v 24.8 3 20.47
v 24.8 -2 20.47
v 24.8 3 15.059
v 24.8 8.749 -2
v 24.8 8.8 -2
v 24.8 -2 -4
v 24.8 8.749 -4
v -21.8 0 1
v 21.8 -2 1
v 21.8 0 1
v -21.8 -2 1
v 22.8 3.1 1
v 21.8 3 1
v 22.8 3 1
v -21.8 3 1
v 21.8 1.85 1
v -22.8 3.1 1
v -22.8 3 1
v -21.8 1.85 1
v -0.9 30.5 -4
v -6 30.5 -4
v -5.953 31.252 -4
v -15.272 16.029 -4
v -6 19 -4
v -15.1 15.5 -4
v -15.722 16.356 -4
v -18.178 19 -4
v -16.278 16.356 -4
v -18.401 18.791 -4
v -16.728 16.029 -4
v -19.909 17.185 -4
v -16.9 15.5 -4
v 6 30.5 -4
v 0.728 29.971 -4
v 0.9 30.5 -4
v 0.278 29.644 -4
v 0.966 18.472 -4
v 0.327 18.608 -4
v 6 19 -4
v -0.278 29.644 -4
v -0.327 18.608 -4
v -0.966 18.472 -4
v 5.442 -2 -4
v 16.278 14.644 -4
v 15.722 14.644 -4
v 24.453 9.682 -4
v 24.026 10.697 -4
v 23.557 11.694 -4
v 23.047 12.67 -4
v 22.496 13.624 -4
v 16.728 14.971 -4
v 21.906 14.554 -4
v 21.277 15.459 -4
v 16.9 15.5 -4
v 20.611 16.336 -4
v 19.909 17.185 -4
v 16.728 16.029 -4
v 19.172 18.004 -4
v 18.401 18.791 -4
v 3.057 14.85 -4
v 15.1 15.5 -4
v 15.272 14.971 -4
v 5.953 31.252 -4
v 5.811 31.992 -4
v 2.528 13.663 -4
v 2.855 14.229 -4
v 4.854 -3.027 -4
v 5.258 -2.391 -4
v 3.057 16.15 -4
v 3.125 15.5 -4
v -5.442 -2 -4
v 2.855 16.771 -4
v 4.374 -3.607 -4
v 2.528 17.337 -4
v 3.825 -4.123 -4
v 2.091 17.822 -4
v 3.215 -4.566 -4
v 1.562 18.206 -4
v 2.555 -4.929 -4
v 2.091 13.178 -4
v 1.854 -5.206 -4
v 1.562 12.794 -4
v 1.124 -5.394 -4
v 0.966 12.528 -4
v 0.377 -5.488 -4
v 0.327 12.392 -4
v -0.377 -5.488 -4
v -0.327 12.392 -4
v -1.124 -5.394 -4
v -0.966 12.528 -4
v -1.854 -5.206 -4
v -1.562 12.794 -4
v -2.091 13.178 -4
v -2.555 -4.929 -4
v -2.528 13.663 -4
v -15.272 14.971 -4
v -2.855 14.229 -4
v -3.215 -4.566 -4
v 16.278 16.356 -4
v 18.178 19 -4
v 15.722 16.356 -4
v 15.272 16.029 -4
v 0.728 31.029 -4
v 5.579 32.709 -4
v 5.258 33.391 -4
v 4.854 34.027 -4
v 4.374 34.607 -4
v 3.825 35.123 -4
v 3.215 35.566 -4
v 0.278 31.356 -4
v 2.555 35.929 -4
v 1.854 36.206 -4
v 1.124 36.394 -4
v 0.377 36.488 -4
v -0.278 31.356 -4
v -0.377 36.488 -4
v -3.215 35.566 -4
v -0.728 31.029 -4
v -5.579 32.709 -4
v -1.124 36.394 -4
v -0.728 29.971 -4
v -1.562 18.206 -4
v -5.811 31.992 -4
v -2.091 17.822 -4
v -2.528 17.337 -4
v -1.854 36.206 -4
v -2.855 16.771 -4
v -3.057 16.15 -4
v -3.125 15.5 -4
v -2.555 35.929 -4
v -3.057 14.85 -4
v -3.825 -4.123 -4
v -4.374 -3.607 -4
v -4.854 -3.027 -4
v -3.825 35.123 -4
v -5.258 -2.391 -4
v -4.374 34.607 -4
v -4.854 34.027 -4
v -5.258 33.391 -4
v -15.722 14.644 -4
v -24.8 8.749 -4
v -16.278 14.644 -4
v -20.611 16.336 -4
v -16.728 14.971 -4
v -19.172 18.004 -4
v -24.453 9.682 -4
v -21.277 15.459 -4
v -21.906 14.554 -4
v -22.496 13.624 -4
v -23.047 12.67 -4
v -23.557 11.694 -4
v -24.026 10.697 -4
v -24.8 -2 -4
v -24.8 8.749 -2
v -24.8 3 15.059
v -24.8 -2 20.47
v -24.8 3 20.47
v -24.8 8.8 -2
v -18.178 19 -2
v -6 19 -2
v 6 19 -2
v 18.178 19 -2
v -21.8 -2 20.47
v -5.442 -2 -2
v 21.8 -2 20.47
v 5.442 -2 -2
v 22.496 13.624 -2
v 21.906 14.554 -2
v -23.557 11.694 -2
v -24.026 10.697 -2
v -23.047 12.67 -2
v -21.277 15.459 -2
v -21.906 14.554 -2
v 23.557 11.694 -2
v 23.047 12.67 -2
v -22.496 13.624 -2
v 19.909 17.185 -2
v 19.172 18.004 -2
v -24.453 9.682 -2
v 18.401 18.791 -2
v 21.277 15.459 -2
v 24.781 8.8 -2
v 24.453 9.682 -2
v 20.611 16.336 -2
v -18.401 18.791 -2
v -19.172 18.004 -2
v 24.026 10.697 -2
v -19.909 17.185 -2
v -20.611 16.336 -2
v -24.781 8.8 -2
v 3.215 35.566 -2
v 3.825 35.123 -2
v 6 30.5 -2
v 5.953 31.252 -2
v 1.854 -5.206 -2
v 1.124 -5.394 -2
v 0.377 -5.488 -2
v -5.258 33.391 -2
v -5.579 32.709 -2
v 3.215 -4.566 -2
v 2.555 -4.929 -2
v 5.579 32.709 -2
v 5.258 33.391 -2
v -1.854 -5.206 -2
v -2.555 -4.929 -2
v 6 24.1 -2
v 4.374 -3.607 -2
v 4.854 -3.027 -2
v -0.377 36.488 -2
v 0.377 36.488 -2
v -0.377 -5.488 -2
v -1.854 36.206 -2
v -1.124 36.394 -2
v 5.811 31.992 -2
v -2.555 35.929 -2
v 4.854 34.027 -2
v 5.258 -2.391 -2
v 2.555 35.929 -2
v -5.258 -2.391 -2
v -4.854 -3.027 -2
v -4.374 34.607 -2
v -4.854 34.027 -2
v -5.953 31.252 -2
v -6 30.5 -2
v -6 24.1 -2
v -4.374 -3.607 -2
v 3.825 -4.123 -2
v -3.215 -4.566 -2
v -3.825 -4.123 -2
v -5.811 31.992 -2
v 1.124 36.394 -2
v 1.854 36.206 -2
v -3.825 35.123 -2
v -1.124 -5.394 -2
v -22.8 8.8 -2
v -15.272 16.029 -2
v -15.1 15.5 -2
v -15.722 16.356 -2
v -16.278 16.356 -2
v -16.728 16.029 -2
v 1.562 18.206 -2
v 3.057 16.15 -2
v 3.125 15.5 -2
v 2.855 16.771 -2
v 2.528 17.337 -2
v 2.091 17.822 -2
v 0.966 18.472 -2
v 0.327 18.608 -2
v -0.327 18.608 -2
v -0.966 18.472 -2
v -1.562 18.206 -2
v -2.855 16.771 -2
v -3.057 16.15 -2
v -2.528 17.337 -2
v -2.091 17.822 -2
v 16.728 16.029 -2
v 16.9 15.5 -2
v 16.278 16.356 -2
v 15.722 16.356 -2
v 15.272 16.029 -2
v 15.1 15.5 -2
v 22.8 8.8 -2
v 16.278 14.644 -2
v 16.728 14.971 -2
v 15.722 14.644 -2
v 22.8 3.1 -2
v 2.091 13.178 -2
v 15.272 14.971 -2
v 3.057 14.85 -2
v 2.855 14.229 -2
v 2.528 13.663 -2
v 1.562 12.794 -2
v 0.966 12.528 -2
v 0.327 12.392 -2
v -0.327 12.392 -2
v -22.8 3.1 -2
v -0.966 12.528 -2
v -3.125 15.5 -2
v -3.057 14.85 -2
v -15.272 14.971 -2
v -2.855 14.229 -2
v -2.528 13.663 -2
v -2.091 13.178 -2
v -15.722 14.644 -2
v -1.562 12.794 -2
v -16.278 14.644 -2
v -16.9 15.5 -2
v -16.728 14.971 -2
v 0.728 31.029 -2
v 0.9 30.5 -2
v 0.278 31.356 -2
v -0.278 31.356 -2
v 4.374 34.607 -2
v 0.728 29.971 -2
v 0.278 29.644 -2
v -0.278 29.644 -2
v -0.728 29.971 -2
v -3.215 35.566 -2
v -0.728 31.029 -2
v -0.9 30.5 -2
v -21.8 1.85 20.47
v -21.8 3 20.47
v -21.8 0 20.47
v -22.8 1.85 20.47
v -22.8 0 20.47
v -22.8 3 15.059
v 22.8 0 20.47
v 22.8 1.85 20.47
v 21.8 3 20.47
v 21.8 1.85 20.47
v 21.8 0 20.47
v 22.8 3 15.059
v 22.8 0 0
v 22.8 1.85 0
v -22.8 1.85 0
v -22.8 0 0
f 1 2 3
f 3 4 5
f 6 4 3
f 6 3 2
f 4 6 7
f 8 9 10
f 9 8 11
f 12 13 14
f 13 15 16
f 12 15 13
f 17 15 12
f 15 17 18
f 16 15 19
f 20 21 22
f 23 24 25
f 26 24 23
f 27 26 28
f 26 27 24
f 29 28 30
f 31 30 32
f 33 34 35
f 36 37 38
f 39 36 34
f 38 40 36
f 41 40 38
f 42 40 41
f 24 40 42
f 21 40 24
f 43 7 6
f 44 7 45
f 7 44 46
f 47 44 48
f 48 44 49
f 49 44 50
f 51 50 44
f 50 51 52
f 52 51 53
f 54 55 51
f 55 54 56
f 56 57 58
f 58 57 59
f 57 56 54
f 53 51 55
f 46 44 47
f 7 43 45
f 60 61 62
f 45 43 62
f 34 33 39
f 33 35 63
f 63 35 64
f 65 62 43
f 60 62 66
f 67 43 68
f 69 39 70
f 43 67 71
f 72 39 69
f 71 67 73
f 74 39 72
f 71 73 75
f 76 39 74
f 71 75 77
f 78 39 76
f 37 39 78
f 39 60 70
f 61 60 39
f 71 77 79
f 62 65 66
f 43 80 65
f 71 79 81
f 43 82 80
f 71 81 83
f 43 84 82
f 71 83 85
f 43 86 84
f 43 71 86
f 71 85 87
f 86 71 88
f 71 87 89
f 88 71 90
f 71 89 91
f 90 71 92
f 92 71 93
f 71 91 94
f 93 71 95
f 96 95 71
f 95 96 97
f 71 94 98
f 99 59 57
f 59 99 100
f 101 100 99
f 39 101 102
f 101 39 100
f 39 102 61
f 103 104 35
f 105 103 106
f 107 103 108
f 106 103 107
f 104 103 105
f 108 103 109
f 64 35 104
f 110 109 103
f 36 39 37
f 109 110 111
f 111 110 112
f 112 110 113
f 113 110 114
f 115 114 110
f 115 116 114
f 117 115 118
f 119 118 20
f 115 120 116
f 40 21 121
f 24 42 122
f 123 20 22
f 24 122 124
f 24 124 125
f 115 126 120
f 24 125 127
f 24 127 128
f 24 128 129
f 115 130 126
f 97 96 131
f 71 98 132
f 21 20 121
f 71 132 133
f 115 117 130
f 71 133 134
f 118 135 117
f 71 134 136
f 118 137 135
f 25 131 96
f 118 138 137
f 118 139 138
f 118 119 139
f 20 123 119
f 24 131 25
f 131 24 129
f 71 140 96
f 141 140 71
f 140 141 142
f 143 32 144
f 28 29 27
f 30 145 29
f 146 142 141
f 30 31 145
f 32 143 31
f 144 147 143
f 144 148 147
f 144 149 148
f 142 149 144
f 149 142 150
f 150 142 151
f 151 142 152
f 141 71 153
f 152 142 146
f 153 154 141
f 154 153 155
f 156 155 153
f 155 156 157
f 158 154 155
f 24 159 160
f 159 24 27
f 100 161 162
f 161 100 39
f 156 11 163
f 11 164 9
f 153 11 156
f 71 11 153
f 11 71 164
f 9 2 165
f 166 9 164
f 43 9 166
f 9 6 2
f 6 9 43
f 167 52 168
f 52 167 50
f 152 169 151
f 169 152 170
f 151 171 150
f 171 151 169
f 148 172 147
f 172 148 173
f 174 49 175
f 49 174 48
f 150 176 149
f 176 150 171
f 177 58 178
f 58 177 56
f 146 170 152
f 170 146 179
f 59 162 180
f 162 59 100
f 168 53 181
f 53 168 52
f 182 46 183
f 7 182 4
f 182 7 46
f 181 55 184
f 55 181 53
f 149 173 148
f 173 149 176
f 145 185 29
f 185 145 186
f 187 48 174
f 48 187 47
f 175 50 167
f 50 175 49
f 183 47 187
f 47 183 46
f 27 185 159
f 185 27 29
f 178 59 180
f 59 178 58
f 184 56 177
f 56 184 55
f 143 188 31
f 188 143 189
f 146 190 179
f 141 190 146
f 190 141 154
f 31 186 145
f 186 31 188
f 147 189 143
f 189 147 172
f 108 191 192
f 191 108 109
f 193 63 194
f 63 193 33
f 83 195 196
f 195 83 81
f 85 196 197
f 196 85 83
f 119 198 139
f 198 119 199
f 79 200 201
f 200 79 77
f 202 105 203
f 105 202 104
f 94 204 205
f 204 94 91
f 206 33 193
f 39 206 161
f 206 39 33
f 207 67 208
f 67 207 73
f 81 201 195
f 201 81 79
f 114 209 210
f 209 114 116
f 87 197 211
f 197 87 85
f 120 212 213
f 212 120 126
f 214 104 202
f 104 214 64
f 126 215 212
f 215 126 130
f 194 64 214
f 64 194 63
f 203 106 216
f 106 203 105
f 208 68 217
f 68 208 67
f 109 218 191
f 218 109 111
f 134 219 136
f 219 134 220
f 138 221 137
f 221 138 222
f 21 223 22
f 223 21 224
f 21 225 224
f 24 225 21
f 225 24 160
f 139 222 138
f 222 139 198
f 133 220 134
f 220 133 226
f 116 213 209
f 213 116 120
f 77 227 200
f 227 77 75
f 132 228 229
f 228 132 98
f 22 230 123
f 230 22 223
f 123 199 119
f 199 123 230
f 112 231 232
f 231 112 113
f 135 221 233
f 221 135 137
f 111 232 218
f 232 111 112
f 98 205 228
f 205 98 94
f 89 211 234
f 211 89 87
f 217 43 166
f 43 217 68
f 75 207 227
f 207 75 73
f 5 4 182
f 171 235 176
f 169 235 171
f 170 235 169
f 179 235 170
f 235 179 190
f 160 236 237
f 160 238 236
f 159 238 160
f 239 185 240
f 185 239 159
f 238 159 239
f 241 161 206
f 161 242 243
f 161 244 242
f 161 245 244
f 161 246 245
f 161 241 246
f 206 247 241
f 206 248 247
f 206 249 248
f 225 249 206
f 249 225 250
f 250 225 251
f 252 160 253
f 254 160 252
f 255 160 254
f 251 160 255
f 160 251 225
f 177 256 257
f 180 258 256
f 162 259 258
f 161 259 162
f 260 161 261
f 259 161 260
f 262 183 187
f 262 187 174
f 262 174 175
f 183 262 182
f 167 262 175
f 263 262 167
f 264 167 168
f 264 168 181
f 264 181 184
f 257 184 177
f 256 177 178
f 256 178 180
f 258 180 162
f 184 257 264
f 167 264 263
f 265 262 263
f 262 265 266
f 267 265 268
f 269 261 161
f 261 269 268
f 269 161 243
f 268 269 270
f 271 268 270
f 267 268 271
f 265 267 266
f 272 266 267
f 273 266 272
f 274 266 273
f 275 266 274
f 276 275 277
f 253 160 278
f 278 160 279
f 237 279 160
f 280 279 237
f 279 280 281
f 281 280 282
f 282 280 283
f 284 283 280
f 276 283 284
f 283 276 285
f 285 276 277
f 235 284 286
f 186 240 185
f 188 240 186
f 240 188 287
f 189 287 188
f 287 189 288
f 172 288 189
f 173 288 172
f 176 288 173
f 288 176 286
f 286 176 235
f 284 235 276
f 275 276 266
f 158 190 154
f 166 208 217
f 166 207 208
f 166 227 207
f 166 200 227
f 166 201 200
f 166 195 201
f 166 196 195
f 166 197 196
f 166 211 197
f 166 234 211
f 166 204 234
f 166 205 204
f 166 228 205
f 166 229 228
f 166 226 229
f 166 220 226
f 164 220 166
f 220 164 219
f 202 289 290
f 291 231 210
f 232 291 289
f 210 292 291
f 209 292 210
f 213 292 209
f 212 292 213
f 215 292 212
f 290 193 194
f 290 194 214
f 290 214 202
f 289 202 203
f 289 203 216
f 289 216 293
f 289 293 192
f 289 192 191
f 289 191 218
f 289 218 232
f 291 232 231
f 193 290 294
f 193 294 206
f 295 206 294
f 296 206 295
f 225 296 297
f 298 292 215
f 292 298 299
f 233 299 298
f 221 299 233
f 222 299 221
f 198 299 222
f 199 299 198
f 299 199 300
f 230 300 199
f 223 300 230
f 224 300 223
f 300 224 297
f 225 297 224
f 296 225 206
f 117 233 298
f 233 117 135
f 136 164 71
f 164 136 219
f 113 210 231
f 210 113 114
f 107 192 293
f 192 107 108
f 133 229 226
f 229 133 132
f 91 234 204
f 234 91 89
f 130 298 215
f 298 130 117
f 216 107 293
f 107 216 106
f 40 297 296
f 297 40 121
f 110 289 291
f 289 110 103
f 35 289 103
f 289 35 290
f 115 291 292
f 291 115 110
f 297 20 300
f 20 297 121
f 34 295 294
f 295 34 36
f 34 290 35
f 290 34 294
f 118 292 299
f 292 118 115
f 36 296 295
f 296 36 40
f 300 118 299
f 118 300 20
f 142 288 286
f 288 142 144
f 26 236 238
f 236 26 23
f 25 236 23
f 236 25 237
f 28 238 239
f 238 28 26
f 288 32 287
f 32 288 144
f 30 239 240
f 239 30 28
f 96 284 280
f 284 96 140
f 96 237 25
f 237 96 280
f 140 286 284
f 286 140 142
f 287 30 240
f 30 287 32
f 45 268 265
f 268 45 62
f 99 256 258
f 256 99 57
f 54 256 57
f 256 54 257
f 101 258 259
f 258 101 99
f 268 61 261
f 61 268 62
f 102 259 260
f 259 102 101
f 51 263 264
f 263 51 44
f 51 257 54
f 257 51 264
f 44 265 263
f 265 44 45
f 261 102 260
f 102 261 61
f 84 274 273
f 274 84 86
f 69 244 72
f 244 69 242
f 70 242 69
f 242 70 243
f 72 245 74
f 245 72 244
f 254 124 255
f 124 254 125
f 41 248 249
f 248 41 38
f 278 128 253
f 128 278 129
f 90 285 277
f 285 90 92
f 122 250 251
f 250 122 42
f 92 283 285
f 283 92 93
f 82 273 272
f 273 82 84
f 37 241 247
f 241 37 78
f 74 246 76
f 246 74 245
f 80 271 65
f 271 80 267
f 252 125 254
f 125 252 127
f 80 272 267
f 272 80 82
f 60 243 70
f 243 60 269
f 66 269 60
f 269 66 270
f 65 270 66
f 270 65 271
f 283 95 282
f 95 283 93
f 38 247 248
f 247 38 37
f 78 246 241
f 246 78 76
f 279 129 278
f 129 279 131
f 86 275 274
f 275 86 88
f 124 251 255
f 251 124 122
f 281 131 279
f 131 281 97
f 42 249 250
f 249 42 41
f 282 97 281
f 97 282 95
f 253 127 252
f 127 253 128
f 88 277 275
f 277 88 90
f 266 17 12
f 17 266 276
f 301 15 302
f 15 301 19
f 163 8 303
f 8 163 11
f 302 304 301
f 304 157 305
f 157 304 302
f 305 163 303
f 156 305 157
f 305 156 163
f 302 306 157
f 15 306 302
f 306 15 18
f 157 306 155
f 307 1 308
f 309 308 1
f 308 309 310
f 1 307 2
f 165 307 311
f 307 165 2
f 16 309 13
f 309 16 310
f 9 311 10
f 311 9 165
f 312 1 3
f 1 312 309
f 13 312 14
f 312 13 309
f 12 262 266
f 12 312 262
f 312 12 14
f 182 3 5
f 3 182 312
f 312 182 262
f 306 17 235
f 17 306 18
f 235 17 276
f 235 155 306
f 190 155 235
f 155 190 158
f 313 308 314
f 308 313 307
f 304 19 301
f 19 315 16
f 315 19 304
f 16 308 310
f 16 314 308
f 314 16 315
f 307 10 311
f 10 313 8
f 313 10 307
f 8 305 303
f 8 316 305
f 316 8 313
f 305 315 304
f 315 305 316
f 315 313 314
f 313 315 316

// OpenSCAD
// Servo Mount for SainSmart HC-SR04 ultrasonic distance sensor
// from http://www.amazon.com/gp/product/B004U8TOE6/
// WARNING: similar devices (even with identical part number)
// have different dimensions, so measure yours before printing
// by J.Beale 31-Dec-2014

slop = 0.25; // allowance for printer tolerance
// ----------------------------------------------------
// Parameters of HC-SR04 circuit board
SSEP = 25.4; // center separation of ultrasonic xducers
SZ = 11.9; // height of transducer cylinders
SOD = 16.0+slop; // OD of transducer cylinders

PCBX = 45.35+slop; // length of PCB
PCBY = 20.5; // width of PCB
PCBZ = 1.6+slop; // z-height of PCB
XTLX = 10.3; // crystal length
XTLY = 4.53; // crystal width
XTLZ = 3.7; // crystal z-height
// HOD = 1.5; // ID of corner mounting holes ID
HOD = 0; // ID of corner mounting holes ID
HCX = 42.35; // X centers of mounting holes
HCY = 17.0; // Y centers of mounting holes
// ----------------------------------------------------

fn = 60; // facets on a circle
eps = 0.03; // a small number

module xducer() {
  translate([SSEP/2,0,0])
    cylinder(d=SOD, h=SZ, $fn=fn); // ult.xducer 1
  translate([-SSEP/2,0,0])
    cylinder(d=SOD, h=SZ, $fn=fn); // ult.xducer 2
}

module xtal() {
    translate([-XTLX/2,XTLY,0]) cube([XTLX,XTLY,XTLZ]);
    
}
module PCB() {
  difference() {
    translate([-PCBX/2,-PCBY/2,0])
      cube([PCBX,PCBY,PCBZ]);    
      // 4x mounting holes at corners
    translate([HCX/2,HCY/2,-PCBZ])
       cylinder(d=HOD, h=PCBZ*3, $fn=12);
    translate([-HCX/2,HCY/2,-PCBZ])
       cylinder(d=HOD, h=PCBZ*3, $fn=12);
    translate([HCX/2,-HCY/2,-PCBZ])
       cylinder(d=HOD, h=PCBZ*3, $fn=12);
    translate([-HCX/2,-HCY/2,-PCBZ])
       cylinder(d=HOD, h=PCBZ*3, $fn=12);
  }
}

module HCSR04() {
  color("grey") translate([0,0,PCBZ]) xducer();
  color([.1,.1,.6]) PCB();
  color([.6,.6,.6]) translate([0,0,PCBZ]) xtal();
  color([.8,.7,.7]) rotate([0,0,180]) 
    translate([0,5,PCBZ]) scale([1,.5,0.5]) xtal();
}


// =============================================================

// Draw a prism based on a right triangle
// l:length, w: width, h: height
// from https://github.com/dannystaple/OpenSCAD-Parts-Library/blob/master/prism.scad
module prism(l, w, h) {
  translate([0, l, 0]) rotate( a= [90, 0, 0])
  linear_extrude(height = l) polygon(points = [
    [0, 0],
    [w, 0],
    [0, h]
  ], paths=[[0,1,2,0]]);
}

BX = PCBX + 4; // mounting base X length
BY = 21; // mounting base Y width
BZ = 5; // mounting base Z thickness 1
BZS = 2; // mounting base Z thickness 2
BZO = 1; // mounting base Z offset
SPX = 3; // side post X width
SPY = 5; // side post Y width
BMH = 32; // base mounting hole center spacing
BMHID = 1.6+0.2; // ID of base mounting holes
BMHY = BY-5.5; // mounting hole Y offset
CMHID = 6.0+slop; // center mnt. hole ID
MTX = 12.0; // front tab X width
MTY = 21; // front tab Y length
MTHY = 15; // mounting tab hole Y offset

module rtab() {
  difference() {
    hull() {
     translate([0,MTY-MTX/2,0]) cylinder(d=MTX,h=BZS,$fn=50);
     translate([0,-(MTY-MTX/2),0]) cylinder(d=MTX,h=BZS,$fn=50);
    }
    translate([0,MTHY,-BZ*2]) cylinder(d=BMHID, h=BZ*4, $fn=10); // hole
  }
}
 
module pcb_holder1() {
 difference() {
  union() {
    intersection() {
      translate([-BX/2,-2,BZO-BZ]) cube([BX,BY,BZ]); // mounting base underneath
      translate([0,0,-BZ]) cylinder(d=BX+3, h=BZ*4, $fn=150); // round off edges
    }
    translate([0,BMHY,BZO-BZ]) rtab(); // front tab
  }
  translate([-BMH/2,BMHY,-BZ*2]) cylinder(d=BMHID, h=BZ*4, $fn=10); // hole 1
  translate([BMH/2,BMHY,-BZ*2]) cylinder(d=BMHID, h=BZ*4, $fn=10); // hole 2    
  translate([0,BMHY,-BZ*2]) cylinder(d=CMHID, h=BZ*4, $fn=30); // hole 3    
  translate([-BX/2-eps,3.1,BZO-(BZ-BZS)]) cube([BX+2*eps,BY,BZ]); // mounting base notch
 }

 translate([-BX/2,-2,0]) cube([SPX,SPY,PCBY-eps]); // side post 1
 translate([BX/2-SPX,-2,0]) cube([SPX,SPY,PCBY-eps]); // side post 2
 translate([BX/2,2,-2]) rotate([0,0,90]) prism(2,6.8,20); // wedge1
 translate([-BX/2+2,2,-2]) rotate([0,0,90]) prism(2,6.8,20); // wedge2
}

module pcb_holder() {
  difference() {
    pcb_holder1();
    translate([0,0,PCBY/2]) rotate([-90,0,0]) HCSR04();
  }
}

// translate([0,0,SZ+PCBZ]) horn();
// horn();
// translate([0,0,IDPTH-(SZ+PCBZ)]) HCSR04(); // ultrasonic transducer module

pcb_holder();
// translate([0,0,PCBY/2]) rotate([-90,0,0]) HCSR04();
